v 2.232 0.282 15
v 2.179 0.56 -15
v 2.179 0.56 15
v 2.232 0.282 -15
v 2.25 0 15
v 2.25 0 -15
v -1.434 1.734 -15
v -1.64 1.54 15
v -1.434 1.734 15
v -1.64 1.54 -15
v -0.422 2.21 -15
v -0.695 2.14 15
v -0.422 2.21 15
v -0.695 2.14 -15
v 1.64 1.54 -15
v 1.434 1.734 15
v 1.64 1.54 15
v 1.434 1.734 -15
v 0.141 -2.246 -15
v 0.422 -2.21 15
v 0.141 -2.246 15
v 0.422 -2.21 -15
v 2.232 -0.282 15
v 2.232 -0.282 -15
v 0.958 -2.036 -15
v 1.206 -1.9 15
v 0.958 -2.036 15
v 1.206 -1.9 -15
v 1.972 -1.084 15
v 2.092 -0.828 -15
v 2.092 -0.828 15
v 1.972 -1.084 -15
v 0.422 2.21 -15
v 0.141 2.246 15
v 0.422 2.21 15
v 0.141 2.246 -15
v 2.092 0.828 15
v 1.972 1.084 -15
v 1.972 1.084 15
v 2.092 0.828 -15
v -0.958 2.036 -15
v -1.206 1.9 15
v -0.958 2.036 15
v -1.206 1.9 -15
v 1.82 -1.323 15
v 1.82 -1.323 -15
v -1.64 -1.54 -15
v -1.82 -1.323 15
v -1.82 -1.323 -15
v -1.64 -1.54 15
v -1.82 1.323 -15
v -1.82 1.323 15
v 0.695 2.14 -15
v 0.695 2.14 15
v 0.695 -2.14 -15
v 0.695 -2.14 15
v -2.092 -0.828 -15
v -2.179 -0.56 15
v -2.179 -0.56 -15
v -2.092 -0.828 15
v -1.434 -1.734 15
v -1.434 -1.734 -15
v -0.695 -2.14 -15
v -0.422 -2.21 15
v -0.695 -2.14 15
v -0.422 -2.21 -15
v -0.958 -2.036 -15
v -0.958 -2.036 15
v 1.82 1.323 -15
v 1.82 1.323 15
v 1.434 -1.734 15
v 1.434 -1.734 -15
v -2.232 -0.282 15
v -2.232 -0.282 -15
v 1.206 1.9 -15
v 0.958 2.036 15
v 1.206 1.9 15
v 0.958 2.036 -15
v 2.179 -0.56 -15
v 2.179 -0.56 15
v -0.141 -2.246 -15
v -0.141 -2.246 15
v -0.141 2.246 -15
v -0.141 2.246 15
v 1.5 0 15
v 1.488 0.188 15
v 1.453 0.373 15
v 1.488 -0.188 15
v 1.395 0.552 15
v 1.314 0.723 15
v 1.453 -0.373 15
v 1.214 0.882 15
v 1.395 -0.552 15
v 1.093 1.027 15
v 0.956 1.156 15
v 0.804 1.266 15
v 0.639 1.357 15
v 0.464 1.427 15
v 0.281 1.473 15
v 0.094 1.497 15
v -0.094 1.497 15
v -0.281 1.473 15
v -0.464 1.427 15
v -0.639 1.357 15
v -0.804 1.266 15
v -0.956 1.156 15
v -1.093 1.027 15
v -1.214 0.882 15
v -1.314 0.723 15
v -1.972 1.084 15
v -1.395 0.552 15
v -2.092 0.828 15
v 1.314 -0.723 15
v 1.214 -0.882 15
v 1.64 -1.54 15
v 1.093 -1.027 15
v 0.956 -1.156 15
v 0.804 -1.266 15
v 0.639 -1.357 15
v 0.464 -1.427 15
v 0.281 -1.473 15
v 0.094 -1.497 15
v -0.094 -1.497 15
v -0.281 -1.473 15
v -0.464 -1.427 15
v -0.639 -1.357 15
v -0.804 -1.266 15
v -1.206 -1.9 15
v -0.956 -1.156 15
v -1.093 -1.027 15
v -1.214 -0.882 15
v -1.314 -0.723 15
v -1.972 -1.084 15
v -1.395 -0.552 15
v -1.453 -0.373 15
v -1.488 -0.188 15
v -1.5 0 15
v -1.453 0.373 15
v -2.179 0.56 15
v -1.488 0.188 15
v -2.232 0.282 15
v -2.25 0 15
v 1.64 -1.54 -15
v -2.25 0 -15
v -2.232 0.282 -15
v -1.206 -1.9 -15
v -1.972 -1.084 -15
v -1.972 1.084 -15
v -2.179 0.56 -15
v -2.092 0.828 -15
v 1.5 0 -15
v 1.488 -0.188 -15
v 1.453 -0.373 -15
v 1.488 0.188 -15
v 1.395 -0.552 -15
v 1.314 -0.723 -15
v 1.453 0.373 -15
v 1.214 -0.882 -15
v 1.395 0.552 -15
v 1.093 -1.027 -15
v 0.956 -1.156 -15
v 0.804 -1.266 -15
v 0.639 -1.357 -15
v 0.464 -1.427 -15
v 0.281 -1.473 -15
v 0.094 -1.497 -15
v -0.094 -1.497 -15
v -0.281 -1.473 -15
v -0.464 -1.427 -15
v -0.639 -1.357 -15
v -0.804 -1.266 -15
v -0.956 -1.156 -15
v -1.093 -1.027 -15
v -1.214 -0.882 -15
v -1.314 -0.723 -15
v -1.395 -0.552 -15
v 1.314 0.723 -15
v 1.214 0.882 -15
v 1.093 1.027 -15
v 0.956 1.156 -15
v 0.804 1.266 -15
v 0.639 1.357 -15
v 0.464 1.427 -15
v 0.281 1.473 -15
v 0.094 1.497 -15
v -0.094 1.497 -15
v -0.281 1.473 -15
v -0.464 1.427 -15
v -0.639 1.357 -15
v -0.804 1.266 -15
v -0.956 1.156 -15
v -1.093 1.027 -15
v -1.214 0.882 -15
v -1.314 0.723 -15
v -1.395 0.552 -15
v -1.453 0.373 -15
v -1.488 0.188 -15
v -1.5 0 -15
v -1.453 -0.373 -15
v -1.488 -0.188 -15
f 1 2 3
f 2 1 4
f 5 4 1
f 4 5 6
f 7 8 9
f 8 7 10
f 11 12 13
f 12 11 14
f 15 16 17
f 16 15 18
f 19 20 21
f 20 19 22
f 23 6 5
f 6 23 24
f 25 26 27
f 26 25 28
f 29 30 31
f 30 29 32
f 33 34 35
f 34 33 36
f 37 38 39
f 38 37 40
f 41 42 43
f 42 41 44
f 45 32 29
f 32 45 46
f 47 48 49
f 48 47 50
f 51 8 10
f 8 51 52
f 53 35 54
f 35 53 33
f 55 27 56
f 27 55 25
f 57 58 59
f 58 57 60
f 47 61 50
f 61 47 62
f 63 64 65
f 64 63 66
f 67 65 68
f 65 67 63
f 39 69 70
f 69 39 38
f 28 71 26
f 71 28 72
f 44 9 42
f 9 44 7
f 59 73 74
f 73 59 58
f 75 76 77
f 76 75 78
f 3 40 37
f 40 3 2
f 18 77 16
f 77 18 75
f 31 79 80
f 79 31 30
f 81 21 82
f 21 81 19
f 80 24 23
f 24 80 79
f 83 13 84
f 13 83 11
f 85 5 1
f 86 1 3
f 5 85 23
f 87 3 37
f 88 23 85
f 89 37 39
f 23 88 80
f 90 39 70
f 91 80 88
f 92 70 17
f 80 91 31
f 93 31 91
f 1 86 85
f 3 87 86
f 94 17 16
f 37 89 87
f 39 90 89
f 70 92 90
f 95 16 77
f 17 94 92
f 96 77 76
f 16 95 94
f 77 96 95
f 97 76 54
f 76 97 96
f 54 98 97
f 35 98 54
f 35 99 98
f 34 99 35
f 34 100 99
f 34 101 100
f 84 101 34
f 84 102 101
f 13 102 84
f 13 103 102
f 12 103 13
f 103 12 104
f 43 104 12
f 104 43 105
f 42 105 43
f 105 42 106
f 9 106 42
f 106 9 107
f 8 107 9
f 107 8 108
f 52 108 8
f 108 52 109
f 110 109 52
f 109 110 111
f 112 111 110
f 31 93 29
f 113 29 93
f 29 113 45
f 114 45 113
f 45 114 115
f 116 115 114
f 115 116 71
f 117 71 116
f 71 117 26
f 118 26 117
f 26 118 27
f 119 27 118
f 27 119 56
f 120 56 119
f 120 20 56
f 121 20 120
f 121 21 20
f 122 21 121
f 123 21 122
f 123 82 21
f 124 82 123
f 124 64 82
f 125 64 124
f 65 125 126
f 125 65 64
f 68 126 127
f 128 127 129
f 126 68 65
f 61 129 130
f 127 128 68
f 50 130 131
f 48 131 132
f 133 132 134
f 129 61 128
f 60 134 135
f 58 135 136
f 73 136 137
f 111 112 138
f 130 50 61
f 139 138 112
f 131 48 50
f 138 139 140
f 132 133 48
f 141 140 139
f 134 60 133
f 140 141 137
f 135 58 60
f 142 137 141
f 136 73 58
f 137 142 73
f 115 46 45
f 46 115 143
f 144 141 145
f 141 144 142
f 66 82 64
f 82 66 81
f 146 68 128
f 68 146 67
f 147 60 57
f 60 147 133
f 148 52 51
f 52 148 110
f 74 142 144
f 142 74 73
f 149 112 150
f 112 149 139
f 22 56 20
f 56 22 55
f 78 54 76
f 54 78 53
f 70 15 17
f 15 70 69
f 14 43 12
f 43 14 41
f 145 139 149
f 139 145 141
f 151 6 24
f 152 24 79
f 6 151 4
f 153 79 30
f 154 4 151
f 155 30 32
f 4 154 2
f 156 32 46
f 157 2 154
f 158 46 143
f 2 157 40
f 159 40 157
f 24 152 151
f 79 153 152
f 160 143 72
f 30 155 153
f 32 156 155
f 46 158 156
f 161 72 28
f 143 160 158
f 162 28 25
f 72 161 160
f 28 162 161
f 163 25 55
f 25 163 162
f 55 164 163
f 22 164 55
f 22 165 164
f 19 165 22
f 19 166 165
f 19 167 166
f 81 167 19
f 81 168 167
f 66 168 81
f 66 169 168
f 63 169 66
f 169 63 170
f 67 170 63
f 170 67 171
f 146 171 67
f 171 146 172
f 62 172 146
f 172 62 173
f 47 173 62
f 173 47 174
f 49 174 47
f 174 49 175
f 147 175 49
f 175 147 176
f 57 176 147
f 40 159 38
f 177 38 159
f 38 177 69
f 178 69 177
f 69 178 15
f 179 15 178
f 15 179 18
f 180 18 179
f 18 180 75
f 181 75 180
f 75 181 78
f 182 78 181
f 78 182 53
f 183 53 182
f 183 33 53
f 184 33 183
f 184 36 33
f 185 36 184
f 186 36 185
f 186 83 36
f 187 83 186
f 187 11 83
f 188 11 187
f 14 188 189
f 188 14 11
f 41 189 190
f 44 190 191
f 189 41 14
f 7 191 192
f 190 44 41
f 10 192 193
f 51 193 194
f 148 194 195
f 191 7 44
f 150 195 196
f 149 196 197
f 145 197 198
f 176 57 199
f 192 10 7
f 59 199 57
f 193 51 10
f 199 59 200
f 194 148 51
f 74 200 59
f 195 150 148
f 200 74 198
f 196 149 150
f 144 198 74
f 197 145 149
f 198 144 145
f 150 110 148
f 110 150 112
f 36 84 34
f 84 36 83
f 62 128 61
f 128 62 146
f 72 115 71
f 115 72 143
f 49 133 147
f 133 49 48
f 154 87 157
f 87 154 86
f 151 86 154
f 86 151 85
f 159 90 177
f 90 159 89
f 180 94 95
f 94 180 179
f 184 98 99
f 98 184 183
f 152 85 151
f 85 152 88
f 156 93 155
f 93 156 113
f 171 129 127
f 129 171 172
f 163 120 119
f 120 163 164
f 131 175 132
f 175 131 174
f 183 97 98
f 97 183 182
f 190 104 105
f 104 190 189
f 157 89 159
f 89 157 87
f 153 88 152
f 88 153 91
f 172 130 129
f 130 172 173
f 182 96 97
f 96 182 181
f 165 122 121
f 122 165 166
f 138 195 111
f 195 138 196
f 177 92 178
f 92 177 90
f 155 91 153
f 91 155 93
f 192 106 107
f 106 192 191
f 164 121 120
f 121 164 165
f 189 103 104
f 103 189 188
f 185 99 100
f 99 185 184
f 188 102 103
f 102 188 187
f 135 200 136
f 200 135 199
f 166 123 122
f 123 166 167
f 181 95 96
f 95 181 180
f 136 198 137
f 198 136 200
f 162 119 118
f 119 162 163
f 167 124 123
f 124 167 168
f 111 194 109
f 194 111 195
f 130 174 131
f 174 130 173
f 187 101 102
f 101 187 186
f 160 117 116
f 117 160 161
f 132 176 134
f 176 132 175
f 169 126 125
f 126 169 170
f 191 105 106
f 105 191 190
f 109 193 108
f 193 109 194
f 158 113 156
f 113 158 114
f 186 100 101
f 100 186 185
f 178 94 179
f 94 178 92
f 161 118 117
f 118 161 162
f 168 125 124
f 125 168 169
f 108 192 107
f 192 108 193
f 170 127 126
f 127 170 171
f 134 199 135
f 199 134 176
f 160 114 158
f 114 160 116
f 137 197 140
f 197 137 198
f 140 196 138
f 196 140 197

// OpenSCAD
$fn = 50;


difference() {
	union() {
		translate(v = [0, 0, -15.0000000000]) {
			cylinder(h = 30, r = 2.2500000000);
		}
	}
	union() {
		translate(v = [0, 0, -100.0000000000]) {
			cylinder(h = 200, r = 1.5000000000);
		}
	}
}
